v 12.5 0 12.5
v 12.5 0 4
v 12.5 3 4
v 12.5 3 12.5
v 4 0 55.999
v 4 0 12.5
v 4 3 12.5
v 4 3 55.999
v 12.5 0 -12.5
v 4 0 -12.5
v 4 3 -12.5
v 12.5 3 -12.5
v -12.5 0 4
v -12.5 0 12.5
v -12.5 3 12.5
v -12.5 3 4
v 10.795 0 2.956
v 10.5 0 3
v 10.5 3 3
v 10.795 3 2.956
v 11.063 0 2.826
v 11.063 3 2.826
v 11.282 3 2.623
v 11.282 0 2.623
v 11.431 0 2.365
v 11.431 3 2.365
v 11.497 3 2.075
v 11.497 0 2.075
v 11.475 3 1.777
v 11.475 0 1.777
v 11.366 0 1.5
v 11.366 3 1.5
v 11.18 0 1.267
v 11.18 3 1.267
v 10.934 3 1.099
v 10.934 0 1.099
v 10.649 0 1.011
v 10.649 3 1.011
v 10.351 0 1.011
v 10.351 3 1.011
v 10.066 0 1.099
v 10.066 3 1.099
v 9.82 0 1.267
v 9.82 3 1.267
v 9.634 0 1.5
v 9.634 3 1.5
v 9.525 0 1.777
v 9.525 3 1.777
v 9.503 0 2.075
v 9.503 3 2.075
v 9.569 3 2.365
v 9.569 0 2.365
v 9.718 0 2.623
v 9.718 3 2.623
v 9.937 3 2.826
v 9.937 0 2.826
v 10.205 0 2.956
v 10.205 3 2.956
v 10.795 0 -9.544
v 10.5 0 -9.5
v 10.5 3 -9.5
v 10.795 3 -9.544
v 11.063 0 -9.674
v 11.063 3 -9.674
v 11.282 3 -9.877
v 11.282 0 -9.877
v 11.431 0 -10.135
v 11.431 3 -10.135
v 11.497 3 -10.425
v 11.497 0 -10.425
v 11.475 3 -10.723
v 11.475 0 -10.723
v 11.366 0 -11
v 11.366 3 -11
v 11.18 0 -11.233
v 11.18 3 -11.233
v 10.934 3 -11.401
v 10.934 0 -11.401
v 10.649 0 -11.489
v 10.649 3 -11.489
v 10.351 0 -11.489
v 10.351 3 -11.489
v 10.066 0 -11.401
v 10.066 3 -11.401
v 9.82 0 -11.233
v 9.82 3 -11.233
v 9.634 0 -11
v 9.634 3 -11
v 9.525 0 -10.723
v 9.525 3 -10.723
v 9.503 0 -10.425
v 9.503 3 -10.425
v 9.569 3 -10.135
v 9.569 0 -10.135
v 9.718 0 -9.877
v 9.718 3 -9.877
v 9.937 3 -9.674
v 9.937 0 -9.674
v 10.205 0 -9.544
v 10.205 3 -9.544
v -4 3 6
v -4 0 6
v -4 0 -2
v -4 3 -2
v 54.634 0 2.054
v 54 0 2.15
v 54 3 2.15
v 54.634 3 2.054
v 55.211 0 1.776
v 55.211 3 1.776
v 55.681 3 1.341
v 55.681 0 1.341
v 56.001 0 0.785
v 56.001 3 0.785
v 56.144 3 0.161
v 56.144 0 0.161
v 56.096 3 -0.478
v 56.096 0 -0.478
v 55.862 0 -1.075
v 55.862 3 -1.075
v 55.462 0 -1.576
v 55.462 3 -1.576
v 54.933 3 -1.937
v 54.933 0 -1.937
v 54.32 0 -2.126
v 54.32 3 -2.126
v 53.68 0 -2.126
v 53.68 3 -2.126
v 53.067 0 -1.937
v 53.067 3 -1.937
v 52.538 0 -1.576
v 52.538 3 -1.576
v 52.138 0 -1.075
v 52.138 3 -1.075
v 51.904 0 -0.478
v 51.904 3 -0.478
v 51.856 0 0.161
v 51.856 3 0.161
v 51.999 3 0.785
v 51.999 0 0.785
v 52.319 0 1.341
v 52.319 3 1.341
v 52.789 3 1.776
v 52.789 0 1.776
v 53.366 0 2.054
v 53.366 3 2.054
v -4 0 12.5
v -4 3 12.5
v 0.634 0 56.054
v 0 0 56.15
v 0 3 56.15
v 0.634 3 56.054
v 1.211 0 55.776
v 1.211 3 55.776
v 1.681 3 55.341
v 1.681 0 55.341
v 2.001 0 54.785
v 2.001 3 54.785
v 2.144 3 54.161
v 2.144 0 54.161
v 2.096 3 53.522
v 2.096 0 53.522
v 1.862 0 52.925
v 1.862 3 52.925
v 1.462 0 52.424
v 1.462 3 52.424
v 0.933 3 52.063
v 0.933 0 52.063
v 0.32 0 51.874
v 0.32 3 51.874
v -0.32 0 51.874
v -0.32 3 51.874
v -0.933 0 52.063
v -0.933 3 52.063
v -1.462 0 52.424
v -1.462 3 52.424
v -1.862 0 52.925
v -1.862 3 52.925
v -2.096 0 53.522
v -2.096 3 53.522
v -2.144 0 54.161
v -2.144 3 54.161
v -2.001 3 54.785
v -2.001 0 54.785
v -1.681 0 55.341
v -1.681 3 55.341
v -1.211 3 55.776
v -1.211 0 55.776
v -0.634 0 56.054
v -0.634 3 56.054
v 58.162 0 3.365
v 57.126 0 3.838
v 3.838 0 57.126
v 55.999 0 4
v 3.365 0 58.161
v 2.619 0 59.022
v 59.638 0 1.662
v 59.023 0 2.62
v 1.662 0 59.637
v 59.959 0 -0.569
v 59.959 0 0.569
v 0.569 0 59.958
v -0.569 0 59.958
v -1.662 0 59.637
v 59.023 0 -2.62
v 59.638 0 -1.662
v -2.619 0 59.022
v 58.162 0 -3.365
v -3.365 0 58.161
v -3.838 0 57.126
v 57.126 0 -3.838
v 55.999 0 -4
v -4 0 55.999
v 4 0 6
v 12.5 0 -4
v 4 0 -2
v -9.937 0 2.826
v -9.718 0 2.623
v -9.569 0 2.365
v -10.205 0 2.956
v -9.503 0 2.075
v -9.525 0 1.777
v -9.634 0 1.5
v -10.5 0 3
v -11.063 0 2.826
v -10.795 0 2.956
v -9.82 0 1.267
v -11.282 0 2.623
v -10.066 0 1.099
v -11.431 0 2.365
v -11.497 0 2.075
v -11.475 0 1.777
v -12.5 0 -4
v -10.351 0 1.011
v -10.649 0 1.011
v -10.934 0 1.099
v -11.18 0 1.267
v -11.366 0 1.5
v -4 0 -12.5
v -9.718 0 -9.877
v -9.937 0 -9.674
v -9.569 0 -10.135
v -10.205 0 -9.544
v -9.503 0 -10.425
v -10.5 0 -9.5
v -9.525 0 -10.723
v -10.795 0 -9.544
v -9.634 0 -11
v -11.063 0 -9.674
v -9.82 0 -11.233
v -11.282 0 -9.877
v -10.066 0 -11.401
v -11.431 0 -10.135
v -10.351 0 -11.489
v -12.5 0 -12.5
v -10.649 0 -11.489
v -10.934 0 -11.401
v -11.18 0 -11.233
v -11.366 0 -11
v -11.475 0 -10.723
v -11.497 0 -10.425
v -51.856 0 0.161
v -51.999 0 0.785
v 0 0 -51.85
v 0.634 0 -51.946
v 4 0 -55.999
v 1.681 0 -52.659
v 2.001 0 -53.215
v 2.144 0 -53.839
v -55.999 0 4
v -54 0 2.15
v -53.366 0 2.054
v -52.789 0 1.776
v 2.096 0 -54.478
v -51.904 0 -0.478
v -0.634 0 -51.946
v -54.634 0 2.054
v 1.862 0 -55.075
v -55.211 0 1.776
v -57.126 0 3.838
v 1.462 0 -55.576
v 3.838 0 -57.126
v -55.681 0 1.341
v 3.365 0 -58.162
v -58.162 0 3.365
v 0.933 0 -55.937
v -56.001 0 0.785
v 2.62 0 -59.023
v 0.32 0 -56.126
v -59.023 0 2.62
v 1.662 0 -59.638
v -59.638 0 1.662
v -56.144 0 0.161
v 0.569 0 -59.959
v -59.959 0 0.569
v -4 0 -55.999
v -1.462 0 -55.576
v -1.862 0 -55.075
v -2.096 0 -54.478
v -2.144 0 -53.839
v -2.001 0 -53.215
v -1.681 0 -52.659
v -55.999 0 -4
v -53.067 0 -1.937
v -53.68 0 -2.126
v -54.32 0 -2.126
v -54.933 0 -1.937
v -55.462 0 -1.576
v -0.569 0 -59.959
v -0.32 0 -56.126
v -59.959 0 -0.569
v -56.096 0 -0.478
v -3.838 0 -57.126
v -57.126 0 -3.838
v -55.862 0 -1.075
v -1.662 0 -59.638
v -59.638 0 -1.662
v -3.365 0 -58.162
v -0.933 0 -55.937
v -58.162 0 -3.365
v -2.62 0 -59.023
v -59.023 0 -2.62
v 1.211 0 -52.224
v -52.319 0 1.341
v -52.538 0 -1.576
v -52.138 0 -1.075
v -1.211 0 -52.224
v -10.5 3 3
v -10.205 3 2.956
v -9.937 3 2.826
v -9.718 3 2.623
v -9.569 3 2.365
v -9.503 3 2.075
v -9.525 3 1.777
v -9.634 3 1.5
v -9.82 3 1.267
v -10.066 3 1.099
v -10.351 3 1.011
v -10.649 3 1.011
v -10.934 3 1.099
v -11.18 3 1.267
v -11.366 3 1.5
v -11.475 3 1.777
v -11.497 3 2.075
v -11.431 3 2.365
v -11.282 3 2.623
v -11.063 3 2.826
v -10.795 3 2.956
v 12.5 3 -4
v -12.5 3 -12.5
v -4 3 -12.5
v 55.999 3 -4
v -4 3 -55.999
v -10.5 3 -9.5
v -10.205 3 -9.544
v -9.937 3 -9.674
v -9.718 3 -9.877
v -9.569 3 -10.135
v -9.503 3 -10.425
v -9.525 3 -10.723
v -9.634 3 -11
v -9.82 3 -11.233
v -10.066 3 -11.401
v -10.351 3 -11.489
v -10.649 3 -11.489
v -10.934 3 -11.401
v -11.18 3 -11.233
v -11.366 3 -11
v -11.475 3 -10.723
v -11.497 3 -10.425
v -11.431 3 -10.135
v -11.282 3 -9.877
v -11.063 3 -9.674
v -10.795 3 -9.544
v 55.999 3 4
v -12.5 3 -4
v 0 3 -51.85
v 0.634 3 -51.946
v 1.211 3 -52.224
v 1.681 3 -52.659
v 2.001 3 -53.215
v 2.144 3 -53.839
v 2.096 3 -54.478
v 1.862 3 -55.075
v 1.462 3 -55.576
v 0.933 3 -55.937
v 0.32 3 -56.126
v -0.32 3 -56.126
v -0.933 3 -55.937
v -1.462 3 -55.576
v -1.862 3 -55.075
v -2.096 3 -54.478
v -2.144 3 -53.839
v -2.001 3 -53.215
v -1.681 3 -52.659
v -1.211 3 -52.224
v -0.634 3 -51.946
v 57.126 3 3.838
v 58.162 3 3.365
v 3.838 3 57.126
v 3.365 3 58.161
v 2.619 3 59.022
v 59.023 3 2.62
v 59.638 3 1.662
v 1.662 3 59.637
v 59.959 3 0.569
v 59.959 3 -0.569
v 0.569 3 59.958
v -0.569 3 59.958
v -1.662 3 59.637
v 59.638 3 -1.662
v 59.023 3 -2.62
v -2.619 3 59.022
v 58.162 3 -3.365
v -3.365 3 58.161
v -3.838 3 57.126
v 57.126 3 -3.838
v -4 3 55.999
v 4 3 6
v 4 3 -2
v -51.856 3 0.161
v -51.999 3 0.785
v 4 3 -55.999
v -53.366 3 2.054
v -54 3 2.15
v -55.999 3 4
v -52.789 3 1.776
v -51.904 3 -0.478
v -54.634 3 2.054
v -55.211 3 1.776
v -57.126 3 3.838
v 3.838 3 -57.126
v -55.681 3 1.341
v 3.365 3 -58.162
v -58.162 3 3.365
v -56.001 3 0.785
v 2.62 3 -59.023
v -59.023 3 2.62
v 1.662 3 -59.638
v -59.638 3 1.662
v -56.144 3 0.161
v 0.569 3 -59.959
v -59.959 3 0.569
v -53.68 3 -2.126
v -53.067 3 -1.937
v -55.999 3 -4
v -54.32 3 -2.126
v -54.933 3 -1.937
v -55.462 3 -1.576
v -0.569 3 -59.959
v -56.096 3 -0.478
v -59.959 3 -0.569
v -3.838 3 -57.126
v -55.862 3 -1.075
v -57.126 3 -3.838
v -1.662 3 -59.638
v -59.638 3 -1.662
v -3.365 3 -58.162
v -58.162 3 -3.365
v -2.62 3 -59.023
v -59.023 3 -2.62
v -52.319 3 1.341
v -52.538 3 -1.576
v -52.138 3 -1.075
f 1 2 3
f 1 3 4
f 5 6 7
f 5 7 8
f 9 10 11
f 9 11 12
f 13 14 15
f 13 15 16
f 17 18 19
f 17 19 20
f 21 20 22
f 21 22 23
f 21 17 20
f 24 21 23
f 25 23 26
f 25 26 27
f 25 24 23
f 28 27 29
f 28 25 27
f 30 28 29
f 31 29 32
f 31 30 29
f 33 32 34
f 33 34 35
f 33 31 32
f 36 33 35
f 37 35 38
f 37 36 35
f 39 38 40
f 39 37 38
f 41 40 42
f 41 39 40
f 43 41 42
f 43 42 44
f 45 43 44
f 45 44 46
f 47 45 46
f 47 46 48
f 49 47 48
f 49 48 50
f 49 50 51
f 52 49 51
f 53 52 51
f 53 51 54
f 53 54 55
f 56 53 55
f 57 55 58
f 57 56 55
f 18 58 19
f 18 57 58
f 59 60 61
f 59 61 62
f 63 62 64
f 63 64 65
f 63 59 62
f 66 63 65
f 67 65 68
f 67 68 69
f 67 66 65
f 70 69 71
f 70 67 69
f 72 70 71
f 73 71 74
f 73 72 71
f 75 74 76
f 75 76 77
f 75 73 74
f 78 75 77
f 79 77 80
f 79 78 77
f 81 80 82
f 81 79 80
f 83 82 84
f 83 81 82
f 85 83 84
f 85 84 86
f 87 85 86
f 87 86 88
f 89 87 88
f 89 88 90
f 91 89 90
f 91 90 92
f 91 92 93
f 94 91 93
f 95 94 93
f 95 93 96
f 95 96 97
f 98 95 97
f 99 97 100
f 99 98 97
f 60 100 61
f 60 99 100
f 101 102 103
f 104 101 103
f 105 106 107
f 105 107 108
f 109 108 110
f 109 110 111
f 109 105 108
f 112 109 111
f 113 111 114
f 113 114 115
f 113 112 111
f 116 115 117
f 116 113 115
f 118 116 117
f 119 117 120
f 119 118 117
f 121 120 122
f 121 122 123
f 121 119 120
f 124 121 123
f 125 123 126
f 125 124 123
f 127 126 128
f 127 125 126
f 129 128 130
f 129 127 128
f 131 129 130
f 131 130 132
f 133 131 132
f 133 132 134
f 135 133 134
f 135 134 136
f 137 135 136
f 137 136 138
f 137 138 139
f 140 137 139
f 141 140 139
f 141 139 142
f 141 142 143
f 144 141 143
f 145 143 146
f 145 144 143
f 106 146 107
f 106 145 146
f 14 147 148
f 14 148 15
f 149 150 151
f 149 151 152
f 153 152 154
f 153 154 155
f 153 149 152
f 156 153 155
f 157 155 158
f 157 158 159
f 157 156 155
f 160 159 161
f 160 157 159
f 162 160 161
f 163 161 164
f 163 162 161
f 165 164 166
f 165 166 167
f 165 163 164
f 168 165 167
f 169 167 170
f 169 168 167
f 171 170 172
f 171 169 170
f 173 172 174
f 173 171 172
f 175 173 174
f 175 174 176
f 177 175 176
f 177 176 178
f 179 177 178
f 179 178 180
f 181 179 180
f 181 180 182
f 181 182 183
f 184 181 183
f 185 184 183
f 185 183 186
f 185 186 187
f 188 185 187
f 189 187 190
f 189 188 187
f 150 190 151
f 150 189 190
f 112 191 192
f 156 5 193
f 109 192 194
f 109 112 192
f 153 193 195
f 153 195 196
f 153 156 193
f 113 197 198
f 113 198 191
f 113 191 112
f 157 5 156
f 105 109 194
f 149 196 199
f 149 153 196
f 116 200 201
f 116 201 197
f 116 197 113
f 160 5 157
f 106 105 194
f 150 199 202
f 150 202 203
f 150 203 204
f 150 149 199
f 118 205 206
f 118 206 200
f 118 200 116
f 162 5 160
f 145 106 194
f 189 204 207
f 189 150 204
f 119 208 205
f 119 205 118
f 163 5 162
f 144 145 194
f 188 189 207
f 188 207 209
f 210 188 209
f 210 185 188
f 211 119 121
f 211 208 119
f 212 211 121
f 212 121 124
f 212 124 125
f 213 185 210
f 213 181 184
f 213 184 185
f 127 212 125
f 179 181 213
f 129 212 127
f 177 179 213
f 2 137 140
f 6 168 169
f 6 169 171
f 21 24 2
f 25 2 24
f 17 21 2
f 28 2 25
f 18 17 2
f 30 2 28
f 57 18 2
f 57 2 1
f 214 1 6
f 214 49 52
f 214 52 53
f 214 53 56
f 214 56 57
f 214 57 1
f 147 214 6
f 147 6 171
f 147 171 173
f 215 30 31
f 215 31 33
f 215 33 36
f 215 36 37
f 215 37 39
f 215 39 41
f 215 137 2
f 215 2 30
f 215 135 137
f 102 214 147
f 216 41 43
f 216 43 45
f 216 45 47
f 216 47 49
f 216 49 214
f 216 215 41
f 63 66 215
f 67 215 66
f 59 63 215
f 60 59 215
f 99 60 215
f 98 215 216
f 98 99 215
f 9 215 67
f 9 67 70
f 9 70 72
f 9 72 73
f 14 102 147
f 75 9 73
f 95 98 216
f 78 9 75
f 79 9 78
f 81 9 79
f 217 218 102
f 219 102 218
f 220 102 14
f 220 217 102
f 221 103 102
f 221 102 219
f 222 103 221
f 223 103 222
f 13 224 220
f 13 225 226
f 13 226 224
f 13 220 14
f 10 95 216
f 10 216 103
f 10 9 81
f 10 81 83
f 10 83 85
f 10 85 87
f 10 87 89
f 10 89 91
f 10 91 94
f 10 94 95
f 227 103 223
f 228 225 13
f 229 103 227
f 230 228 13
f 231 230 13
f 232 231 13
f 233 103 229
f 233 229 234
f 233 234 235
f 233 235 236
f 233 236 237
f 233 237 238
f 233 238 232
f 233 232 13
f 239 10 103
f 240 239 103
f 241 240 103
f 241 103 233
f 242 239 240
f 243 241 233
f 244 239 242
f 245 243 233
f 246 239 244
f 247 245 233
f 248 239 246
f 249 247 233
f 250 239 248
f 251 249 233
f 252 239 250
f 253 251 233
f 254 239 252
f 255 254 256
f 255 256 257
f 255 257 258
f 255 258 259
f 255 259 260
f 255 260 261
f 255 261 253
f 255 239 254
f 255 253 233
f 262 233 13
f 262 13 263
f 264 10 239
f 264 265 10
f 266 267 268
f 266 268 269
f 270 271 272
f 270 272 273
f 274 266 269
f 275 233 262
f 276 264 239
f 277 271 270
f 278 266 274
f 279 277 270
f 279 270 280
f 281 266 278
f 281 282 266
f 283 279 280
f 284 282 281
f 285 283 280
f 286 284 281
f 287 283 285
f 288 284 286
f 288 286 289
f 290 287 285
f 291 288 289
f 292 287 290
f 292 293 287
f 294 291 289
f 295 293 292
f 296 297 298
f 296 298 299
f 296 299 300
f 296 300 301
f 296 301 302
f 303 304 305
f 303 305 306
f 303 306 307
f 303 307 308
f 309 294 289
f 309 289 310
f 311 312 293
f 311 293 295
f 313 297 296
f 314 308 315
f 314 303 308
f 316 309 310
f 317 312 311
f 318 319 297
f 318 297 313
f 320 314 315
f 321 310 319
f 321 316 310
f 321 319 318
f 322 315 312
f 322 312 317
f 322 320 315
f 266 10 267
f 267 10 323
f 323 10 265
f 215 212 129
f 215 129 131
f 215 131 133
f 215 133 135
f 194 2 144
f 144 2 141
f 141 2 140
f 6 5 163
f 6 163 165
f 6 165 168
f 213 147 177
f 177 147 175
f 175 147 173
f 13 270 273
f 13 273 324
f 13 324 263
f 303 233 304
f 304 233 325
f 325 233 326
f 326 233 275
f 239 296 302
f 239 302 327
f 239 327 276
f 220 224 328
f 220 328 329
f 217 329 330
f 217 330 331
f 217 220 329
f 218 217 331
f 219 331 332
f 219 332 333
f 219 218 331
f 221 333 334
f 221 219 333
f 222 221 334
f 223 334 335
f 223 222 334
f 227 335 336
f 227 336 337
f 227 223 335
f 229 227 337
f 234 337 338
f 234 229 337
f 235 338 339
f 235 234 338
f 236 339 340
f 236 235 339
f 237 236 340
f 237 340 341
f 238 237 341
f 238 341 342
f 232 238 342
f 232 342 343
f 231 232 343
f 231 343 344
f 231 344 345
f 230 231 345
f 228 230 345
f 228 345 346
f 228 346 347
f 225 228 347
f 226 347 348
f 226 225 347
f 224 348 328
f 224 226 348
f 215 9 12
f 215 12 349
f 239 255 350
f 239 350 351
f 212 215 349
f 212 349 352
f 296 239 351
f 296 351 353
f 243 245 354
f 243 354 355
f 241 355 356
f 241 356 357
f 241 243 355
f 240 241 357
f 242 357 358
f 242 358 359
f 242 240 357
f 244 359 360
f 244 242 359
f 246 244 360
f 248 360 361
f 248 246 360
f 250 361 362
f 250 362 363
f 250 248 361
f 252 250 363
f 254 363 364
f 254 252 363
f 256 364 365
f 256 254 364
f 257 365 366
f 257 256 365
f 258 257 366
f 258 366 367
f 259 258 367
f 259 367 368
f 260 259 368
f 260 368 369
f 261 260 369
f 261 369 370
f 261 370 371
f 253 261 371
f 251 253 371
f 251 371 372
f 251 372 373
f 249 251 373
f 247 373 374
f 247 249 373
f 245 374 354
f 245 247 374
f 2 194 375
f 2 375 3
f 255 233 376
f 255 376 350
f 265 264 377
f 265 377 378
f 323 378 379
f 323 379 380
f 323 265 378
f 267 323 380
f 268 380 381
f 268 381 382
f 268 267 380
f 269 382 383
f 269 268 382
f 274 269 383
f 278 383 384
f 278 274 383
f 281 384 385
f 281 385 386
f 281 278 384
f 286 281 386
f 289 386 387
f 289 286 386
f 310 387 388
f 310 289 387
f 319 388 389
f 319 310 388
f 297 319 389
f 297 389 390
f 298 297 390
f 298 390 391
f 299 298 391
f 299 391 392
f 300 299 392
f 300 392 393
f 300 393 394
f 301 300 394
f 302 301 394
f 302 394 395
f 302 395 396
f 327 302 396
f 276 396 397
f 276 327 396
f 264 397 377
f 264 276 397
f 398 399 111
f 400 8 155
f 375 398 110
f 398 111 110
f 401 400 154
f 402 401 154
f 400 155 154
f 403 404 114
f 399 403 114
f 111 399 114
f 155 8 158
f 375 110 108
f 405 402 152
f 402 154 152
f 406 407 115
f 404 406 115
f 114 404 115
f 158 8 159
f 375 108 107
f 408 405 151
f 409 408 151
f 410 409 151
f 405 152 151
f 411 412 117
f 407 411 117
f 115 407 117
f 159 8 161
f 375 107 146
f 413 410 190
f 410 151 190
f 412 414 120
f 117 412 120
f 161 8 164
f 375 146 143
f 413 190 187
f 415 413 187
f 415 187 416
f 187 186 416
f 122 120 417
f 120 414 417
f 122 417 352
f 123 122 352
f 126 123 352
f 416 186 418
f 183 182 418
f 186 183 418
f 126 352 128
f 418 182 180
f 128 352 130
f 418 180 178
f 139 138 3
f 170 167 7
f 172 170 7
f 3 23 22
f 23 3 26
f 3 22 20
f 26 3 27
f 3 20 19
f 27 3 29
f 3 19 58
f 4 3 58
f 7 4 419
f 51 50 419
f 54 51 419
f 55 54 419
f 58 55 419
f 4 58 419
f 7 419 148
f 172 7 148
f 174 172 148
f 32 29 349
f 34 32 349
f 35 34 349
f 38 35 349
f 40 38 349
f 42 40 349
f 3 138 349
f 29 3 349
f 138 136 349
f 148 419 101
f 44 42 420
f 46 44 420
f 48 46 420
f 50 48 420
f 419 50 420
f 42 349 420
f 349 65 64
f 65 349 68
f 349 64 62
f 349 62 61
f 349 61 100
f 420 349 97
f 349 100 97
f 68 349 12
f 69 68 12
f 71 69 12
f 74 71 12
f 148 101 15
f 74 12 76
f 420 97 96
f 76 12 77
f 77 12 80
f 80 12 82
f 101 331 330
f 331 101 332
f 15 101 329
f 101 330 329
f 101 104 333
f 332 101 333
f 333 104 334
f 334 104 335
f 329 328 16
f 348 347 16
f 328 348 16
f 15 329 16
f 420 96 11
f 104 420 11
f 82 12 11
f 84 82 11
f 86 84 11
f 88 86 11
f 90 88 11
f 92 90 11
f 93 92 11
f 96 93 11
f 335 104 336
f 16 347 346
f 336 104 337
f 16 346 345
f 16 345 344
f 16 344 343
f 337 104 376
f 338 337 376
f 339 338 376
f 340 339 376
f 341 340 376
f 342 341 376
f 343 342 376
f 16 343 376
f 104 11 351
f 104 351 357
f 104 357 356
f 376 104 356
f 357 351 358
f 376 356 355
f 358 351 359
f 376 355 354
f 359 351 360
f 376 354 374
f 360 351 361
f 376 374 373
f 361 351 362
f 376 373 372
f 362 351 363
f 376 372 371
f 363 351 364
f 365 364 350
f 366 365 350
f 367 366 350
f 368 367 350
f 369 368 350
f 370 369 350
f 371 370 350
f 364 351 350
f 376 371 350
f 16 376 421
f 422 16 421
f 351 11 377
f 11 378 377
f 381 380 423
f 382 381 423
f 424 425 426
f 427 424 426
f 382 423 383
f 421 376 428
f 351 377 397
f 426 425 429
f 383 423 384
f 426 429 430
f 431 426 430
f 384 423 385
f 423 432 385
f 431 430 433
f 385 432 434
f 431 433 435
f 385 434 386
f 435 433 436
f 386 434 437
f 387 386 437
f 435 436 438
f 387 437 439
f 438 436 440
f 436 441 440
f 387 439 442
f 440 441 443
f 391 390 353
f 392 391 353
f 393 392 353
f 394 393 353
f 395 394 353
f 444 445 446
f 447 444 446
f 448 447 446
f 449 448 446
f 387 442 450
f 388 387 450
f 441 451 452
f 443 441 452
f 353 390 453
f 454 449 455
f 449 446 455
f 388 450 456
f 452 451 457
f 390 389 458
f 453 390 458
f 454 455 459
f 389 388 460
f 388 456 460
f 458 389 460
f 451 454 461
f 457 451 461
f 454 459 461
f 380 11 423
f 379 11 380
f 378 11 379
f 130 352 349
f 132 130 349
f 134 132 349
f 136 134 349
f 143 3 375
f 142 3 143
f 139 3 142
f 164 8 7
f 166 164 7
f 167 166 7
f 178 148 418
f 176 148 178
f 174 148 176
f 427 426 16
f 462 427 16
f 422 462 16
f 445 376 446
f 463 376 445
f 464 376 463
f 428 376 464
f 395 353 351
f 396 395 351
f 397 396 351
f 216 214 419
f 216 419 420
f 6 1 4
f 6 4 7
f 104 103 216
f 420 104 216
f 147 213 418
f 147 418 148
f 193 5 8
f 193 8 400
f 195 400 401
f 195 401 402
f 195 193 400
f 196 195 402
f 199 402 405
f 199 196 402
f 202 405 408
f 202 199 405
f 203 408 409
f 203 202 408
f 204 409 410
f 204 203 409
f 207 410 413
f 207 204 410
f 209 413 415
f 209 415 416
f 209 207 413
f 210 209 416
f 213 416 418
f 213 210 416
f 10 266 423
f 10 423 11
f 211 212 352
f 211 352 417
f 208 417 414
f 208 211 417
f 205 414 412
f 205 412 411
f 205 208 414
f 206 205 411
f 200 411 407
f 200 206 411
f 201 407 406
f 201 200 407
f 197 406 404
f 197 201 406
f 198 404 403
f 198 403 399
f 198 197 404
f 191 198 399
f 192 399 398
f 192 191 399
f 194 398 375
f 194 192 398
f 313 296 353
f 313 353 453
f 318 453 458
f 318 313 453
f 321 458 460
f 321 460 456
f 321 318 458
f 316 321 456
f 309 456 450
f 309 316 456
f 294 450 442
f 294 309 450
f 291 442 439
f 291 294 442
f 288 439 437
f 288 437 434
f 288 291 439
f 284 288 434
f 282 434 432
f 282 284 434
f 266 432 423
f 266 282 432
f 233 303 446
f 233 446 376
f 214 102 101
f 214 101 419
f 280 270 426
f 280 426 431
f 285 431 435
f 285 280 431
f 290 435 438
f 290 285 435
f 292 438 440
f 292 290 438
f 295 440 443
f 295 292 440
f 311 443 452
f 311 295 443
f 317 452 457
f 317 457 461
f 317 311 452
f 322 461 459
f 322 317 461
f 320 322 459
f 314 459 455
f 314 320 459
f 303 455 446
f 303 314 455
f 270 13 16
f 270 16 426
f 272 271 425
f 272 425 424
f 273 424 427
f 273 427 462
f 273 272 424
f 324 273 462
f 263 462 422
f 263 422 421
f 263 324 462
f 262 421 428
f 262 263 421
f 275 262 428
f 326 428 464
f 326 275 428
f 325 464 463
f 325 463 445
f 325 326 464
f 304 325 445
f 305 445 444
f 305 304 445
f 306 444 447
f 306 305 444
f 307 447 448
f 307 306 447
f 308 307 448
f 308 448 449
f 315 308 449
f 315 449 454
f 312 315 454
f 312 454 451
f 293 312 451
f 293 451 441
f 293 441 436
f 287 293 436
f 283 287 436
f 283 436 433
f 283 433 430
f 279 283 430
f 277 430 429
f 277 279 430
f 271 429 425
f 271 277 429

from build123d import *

# Parameters (mm, degrees)
SCHIZZO1_R                   = 1
SCHIZZO1_R_2                 = 2.15
SCHIZZO1_W                   = 8
SCHIZZO1_H                   = 8
ESTRUSIONE_ESTRUSIONE1_DEPTH = 3


with BuildPart() as part:
    # Schizzo1 → Estrusione-Estrusione1 (new body)
    with BuildSketch(Plane(origin=(0, 0, 0), x_dir=(1, 0, 0), z_dir=(0, 1, 0))):
        with BuildLine():
            Line((4, 55.99875276), (4, 12.5))
            Line((4, 12.5), (12.5, 12.5))
            Line((12.5, 12.5), (12.5, 4))
            Line((12.5, 4), (55.99875276, 4))
            ThreePointArc((55.99875276, 4), (60, 0), (55.99875276, -4))
            Line((55.99875276, -4), (12.5, -4))
            Line((12.5, -4), (12.5, -12.5))
            Line((12.5, -12.5), (4, -12.5))
            Line((4, -12.5), (4, -55.99875276))
            ThreePointArc((4, -55.99875276), (0, -59.99875276), (-4, -55.99875276))
            Line((-4, -55.99875276), (-4, -12.5))
            Line((-4, -12.5), (-12.5, -12.5))
            Line((-12.5, -12.5), (-12.5, -4))
            Line((-12.5, -4), (-55.99875276, -4))
            ThreePointArc((-55.99875276, -4), (-60.000000389, 0), (-55.99875276, 4))
            Line((-55.99875276, 4), (-12.5, 4))
            Line((-12.5, 4), (-12.5, 12.5))
            Line((-12.5, 12.5), (-4, 12.5))
            Line((-4, 12.5), (-4, 55.99875276))
            ThreePointArc((-4, 55.99875276), (0, 60), (4, 55.99875276))
        make_face()
        with Locations(Location((-10.5, 10.5, 0), (0, 0, 270))):
            Circle(SCHIZZO1_R, mode=Mode.SUBTRACT)
        with Locations(Location((10.5, 10.5, 0), (0, 0, 270))):
            Circle(SCHIZZO1_R, mode=Mode.SUBTRACT)
        with Locations(Location((-10.5, -2, 0), (0, 0, 270))):
            Circle(SCHIZZO1_R, mode=Mode.SUBTRACT)
        with Locations(Location((10.5, -2, 0), (0, 0, 270))):
            Circle(SCHIZZO1_R, mode=Mode.SUBTRACT)
        with Locations(Location((-54, 0, 0), (0, 0, 270))):
            Circle(SCHIZZO1_R_2, mode=Mode.SUBTRACT)
        with Locations(Location((0, 54, 0), (0, 0, 270))):
            Circle(SCHIZZO1_R_2, mode=Mode.SUBTRACT)
        with Locations(Location((54, 0, 0), (0, 0, 270))):
            Circle(SCHIZZO1_R_2, mode=Mode.SUBTRACT)
        with Locations(Location((0, -54, 0), (0, 0, 270))):
            Circle(SCHIZZO1_R_2, mode=Mode.SUBTRACT)
        with Locations((0, -2)):
            Rectangle(SCHIZZO1_W, SCHIZZO1_H, mode=Mode.SUBTRACT)
    extrude(amount=ESTRUSIONE_ESTRUSIONE1_DEPTH)


solid = part.part
